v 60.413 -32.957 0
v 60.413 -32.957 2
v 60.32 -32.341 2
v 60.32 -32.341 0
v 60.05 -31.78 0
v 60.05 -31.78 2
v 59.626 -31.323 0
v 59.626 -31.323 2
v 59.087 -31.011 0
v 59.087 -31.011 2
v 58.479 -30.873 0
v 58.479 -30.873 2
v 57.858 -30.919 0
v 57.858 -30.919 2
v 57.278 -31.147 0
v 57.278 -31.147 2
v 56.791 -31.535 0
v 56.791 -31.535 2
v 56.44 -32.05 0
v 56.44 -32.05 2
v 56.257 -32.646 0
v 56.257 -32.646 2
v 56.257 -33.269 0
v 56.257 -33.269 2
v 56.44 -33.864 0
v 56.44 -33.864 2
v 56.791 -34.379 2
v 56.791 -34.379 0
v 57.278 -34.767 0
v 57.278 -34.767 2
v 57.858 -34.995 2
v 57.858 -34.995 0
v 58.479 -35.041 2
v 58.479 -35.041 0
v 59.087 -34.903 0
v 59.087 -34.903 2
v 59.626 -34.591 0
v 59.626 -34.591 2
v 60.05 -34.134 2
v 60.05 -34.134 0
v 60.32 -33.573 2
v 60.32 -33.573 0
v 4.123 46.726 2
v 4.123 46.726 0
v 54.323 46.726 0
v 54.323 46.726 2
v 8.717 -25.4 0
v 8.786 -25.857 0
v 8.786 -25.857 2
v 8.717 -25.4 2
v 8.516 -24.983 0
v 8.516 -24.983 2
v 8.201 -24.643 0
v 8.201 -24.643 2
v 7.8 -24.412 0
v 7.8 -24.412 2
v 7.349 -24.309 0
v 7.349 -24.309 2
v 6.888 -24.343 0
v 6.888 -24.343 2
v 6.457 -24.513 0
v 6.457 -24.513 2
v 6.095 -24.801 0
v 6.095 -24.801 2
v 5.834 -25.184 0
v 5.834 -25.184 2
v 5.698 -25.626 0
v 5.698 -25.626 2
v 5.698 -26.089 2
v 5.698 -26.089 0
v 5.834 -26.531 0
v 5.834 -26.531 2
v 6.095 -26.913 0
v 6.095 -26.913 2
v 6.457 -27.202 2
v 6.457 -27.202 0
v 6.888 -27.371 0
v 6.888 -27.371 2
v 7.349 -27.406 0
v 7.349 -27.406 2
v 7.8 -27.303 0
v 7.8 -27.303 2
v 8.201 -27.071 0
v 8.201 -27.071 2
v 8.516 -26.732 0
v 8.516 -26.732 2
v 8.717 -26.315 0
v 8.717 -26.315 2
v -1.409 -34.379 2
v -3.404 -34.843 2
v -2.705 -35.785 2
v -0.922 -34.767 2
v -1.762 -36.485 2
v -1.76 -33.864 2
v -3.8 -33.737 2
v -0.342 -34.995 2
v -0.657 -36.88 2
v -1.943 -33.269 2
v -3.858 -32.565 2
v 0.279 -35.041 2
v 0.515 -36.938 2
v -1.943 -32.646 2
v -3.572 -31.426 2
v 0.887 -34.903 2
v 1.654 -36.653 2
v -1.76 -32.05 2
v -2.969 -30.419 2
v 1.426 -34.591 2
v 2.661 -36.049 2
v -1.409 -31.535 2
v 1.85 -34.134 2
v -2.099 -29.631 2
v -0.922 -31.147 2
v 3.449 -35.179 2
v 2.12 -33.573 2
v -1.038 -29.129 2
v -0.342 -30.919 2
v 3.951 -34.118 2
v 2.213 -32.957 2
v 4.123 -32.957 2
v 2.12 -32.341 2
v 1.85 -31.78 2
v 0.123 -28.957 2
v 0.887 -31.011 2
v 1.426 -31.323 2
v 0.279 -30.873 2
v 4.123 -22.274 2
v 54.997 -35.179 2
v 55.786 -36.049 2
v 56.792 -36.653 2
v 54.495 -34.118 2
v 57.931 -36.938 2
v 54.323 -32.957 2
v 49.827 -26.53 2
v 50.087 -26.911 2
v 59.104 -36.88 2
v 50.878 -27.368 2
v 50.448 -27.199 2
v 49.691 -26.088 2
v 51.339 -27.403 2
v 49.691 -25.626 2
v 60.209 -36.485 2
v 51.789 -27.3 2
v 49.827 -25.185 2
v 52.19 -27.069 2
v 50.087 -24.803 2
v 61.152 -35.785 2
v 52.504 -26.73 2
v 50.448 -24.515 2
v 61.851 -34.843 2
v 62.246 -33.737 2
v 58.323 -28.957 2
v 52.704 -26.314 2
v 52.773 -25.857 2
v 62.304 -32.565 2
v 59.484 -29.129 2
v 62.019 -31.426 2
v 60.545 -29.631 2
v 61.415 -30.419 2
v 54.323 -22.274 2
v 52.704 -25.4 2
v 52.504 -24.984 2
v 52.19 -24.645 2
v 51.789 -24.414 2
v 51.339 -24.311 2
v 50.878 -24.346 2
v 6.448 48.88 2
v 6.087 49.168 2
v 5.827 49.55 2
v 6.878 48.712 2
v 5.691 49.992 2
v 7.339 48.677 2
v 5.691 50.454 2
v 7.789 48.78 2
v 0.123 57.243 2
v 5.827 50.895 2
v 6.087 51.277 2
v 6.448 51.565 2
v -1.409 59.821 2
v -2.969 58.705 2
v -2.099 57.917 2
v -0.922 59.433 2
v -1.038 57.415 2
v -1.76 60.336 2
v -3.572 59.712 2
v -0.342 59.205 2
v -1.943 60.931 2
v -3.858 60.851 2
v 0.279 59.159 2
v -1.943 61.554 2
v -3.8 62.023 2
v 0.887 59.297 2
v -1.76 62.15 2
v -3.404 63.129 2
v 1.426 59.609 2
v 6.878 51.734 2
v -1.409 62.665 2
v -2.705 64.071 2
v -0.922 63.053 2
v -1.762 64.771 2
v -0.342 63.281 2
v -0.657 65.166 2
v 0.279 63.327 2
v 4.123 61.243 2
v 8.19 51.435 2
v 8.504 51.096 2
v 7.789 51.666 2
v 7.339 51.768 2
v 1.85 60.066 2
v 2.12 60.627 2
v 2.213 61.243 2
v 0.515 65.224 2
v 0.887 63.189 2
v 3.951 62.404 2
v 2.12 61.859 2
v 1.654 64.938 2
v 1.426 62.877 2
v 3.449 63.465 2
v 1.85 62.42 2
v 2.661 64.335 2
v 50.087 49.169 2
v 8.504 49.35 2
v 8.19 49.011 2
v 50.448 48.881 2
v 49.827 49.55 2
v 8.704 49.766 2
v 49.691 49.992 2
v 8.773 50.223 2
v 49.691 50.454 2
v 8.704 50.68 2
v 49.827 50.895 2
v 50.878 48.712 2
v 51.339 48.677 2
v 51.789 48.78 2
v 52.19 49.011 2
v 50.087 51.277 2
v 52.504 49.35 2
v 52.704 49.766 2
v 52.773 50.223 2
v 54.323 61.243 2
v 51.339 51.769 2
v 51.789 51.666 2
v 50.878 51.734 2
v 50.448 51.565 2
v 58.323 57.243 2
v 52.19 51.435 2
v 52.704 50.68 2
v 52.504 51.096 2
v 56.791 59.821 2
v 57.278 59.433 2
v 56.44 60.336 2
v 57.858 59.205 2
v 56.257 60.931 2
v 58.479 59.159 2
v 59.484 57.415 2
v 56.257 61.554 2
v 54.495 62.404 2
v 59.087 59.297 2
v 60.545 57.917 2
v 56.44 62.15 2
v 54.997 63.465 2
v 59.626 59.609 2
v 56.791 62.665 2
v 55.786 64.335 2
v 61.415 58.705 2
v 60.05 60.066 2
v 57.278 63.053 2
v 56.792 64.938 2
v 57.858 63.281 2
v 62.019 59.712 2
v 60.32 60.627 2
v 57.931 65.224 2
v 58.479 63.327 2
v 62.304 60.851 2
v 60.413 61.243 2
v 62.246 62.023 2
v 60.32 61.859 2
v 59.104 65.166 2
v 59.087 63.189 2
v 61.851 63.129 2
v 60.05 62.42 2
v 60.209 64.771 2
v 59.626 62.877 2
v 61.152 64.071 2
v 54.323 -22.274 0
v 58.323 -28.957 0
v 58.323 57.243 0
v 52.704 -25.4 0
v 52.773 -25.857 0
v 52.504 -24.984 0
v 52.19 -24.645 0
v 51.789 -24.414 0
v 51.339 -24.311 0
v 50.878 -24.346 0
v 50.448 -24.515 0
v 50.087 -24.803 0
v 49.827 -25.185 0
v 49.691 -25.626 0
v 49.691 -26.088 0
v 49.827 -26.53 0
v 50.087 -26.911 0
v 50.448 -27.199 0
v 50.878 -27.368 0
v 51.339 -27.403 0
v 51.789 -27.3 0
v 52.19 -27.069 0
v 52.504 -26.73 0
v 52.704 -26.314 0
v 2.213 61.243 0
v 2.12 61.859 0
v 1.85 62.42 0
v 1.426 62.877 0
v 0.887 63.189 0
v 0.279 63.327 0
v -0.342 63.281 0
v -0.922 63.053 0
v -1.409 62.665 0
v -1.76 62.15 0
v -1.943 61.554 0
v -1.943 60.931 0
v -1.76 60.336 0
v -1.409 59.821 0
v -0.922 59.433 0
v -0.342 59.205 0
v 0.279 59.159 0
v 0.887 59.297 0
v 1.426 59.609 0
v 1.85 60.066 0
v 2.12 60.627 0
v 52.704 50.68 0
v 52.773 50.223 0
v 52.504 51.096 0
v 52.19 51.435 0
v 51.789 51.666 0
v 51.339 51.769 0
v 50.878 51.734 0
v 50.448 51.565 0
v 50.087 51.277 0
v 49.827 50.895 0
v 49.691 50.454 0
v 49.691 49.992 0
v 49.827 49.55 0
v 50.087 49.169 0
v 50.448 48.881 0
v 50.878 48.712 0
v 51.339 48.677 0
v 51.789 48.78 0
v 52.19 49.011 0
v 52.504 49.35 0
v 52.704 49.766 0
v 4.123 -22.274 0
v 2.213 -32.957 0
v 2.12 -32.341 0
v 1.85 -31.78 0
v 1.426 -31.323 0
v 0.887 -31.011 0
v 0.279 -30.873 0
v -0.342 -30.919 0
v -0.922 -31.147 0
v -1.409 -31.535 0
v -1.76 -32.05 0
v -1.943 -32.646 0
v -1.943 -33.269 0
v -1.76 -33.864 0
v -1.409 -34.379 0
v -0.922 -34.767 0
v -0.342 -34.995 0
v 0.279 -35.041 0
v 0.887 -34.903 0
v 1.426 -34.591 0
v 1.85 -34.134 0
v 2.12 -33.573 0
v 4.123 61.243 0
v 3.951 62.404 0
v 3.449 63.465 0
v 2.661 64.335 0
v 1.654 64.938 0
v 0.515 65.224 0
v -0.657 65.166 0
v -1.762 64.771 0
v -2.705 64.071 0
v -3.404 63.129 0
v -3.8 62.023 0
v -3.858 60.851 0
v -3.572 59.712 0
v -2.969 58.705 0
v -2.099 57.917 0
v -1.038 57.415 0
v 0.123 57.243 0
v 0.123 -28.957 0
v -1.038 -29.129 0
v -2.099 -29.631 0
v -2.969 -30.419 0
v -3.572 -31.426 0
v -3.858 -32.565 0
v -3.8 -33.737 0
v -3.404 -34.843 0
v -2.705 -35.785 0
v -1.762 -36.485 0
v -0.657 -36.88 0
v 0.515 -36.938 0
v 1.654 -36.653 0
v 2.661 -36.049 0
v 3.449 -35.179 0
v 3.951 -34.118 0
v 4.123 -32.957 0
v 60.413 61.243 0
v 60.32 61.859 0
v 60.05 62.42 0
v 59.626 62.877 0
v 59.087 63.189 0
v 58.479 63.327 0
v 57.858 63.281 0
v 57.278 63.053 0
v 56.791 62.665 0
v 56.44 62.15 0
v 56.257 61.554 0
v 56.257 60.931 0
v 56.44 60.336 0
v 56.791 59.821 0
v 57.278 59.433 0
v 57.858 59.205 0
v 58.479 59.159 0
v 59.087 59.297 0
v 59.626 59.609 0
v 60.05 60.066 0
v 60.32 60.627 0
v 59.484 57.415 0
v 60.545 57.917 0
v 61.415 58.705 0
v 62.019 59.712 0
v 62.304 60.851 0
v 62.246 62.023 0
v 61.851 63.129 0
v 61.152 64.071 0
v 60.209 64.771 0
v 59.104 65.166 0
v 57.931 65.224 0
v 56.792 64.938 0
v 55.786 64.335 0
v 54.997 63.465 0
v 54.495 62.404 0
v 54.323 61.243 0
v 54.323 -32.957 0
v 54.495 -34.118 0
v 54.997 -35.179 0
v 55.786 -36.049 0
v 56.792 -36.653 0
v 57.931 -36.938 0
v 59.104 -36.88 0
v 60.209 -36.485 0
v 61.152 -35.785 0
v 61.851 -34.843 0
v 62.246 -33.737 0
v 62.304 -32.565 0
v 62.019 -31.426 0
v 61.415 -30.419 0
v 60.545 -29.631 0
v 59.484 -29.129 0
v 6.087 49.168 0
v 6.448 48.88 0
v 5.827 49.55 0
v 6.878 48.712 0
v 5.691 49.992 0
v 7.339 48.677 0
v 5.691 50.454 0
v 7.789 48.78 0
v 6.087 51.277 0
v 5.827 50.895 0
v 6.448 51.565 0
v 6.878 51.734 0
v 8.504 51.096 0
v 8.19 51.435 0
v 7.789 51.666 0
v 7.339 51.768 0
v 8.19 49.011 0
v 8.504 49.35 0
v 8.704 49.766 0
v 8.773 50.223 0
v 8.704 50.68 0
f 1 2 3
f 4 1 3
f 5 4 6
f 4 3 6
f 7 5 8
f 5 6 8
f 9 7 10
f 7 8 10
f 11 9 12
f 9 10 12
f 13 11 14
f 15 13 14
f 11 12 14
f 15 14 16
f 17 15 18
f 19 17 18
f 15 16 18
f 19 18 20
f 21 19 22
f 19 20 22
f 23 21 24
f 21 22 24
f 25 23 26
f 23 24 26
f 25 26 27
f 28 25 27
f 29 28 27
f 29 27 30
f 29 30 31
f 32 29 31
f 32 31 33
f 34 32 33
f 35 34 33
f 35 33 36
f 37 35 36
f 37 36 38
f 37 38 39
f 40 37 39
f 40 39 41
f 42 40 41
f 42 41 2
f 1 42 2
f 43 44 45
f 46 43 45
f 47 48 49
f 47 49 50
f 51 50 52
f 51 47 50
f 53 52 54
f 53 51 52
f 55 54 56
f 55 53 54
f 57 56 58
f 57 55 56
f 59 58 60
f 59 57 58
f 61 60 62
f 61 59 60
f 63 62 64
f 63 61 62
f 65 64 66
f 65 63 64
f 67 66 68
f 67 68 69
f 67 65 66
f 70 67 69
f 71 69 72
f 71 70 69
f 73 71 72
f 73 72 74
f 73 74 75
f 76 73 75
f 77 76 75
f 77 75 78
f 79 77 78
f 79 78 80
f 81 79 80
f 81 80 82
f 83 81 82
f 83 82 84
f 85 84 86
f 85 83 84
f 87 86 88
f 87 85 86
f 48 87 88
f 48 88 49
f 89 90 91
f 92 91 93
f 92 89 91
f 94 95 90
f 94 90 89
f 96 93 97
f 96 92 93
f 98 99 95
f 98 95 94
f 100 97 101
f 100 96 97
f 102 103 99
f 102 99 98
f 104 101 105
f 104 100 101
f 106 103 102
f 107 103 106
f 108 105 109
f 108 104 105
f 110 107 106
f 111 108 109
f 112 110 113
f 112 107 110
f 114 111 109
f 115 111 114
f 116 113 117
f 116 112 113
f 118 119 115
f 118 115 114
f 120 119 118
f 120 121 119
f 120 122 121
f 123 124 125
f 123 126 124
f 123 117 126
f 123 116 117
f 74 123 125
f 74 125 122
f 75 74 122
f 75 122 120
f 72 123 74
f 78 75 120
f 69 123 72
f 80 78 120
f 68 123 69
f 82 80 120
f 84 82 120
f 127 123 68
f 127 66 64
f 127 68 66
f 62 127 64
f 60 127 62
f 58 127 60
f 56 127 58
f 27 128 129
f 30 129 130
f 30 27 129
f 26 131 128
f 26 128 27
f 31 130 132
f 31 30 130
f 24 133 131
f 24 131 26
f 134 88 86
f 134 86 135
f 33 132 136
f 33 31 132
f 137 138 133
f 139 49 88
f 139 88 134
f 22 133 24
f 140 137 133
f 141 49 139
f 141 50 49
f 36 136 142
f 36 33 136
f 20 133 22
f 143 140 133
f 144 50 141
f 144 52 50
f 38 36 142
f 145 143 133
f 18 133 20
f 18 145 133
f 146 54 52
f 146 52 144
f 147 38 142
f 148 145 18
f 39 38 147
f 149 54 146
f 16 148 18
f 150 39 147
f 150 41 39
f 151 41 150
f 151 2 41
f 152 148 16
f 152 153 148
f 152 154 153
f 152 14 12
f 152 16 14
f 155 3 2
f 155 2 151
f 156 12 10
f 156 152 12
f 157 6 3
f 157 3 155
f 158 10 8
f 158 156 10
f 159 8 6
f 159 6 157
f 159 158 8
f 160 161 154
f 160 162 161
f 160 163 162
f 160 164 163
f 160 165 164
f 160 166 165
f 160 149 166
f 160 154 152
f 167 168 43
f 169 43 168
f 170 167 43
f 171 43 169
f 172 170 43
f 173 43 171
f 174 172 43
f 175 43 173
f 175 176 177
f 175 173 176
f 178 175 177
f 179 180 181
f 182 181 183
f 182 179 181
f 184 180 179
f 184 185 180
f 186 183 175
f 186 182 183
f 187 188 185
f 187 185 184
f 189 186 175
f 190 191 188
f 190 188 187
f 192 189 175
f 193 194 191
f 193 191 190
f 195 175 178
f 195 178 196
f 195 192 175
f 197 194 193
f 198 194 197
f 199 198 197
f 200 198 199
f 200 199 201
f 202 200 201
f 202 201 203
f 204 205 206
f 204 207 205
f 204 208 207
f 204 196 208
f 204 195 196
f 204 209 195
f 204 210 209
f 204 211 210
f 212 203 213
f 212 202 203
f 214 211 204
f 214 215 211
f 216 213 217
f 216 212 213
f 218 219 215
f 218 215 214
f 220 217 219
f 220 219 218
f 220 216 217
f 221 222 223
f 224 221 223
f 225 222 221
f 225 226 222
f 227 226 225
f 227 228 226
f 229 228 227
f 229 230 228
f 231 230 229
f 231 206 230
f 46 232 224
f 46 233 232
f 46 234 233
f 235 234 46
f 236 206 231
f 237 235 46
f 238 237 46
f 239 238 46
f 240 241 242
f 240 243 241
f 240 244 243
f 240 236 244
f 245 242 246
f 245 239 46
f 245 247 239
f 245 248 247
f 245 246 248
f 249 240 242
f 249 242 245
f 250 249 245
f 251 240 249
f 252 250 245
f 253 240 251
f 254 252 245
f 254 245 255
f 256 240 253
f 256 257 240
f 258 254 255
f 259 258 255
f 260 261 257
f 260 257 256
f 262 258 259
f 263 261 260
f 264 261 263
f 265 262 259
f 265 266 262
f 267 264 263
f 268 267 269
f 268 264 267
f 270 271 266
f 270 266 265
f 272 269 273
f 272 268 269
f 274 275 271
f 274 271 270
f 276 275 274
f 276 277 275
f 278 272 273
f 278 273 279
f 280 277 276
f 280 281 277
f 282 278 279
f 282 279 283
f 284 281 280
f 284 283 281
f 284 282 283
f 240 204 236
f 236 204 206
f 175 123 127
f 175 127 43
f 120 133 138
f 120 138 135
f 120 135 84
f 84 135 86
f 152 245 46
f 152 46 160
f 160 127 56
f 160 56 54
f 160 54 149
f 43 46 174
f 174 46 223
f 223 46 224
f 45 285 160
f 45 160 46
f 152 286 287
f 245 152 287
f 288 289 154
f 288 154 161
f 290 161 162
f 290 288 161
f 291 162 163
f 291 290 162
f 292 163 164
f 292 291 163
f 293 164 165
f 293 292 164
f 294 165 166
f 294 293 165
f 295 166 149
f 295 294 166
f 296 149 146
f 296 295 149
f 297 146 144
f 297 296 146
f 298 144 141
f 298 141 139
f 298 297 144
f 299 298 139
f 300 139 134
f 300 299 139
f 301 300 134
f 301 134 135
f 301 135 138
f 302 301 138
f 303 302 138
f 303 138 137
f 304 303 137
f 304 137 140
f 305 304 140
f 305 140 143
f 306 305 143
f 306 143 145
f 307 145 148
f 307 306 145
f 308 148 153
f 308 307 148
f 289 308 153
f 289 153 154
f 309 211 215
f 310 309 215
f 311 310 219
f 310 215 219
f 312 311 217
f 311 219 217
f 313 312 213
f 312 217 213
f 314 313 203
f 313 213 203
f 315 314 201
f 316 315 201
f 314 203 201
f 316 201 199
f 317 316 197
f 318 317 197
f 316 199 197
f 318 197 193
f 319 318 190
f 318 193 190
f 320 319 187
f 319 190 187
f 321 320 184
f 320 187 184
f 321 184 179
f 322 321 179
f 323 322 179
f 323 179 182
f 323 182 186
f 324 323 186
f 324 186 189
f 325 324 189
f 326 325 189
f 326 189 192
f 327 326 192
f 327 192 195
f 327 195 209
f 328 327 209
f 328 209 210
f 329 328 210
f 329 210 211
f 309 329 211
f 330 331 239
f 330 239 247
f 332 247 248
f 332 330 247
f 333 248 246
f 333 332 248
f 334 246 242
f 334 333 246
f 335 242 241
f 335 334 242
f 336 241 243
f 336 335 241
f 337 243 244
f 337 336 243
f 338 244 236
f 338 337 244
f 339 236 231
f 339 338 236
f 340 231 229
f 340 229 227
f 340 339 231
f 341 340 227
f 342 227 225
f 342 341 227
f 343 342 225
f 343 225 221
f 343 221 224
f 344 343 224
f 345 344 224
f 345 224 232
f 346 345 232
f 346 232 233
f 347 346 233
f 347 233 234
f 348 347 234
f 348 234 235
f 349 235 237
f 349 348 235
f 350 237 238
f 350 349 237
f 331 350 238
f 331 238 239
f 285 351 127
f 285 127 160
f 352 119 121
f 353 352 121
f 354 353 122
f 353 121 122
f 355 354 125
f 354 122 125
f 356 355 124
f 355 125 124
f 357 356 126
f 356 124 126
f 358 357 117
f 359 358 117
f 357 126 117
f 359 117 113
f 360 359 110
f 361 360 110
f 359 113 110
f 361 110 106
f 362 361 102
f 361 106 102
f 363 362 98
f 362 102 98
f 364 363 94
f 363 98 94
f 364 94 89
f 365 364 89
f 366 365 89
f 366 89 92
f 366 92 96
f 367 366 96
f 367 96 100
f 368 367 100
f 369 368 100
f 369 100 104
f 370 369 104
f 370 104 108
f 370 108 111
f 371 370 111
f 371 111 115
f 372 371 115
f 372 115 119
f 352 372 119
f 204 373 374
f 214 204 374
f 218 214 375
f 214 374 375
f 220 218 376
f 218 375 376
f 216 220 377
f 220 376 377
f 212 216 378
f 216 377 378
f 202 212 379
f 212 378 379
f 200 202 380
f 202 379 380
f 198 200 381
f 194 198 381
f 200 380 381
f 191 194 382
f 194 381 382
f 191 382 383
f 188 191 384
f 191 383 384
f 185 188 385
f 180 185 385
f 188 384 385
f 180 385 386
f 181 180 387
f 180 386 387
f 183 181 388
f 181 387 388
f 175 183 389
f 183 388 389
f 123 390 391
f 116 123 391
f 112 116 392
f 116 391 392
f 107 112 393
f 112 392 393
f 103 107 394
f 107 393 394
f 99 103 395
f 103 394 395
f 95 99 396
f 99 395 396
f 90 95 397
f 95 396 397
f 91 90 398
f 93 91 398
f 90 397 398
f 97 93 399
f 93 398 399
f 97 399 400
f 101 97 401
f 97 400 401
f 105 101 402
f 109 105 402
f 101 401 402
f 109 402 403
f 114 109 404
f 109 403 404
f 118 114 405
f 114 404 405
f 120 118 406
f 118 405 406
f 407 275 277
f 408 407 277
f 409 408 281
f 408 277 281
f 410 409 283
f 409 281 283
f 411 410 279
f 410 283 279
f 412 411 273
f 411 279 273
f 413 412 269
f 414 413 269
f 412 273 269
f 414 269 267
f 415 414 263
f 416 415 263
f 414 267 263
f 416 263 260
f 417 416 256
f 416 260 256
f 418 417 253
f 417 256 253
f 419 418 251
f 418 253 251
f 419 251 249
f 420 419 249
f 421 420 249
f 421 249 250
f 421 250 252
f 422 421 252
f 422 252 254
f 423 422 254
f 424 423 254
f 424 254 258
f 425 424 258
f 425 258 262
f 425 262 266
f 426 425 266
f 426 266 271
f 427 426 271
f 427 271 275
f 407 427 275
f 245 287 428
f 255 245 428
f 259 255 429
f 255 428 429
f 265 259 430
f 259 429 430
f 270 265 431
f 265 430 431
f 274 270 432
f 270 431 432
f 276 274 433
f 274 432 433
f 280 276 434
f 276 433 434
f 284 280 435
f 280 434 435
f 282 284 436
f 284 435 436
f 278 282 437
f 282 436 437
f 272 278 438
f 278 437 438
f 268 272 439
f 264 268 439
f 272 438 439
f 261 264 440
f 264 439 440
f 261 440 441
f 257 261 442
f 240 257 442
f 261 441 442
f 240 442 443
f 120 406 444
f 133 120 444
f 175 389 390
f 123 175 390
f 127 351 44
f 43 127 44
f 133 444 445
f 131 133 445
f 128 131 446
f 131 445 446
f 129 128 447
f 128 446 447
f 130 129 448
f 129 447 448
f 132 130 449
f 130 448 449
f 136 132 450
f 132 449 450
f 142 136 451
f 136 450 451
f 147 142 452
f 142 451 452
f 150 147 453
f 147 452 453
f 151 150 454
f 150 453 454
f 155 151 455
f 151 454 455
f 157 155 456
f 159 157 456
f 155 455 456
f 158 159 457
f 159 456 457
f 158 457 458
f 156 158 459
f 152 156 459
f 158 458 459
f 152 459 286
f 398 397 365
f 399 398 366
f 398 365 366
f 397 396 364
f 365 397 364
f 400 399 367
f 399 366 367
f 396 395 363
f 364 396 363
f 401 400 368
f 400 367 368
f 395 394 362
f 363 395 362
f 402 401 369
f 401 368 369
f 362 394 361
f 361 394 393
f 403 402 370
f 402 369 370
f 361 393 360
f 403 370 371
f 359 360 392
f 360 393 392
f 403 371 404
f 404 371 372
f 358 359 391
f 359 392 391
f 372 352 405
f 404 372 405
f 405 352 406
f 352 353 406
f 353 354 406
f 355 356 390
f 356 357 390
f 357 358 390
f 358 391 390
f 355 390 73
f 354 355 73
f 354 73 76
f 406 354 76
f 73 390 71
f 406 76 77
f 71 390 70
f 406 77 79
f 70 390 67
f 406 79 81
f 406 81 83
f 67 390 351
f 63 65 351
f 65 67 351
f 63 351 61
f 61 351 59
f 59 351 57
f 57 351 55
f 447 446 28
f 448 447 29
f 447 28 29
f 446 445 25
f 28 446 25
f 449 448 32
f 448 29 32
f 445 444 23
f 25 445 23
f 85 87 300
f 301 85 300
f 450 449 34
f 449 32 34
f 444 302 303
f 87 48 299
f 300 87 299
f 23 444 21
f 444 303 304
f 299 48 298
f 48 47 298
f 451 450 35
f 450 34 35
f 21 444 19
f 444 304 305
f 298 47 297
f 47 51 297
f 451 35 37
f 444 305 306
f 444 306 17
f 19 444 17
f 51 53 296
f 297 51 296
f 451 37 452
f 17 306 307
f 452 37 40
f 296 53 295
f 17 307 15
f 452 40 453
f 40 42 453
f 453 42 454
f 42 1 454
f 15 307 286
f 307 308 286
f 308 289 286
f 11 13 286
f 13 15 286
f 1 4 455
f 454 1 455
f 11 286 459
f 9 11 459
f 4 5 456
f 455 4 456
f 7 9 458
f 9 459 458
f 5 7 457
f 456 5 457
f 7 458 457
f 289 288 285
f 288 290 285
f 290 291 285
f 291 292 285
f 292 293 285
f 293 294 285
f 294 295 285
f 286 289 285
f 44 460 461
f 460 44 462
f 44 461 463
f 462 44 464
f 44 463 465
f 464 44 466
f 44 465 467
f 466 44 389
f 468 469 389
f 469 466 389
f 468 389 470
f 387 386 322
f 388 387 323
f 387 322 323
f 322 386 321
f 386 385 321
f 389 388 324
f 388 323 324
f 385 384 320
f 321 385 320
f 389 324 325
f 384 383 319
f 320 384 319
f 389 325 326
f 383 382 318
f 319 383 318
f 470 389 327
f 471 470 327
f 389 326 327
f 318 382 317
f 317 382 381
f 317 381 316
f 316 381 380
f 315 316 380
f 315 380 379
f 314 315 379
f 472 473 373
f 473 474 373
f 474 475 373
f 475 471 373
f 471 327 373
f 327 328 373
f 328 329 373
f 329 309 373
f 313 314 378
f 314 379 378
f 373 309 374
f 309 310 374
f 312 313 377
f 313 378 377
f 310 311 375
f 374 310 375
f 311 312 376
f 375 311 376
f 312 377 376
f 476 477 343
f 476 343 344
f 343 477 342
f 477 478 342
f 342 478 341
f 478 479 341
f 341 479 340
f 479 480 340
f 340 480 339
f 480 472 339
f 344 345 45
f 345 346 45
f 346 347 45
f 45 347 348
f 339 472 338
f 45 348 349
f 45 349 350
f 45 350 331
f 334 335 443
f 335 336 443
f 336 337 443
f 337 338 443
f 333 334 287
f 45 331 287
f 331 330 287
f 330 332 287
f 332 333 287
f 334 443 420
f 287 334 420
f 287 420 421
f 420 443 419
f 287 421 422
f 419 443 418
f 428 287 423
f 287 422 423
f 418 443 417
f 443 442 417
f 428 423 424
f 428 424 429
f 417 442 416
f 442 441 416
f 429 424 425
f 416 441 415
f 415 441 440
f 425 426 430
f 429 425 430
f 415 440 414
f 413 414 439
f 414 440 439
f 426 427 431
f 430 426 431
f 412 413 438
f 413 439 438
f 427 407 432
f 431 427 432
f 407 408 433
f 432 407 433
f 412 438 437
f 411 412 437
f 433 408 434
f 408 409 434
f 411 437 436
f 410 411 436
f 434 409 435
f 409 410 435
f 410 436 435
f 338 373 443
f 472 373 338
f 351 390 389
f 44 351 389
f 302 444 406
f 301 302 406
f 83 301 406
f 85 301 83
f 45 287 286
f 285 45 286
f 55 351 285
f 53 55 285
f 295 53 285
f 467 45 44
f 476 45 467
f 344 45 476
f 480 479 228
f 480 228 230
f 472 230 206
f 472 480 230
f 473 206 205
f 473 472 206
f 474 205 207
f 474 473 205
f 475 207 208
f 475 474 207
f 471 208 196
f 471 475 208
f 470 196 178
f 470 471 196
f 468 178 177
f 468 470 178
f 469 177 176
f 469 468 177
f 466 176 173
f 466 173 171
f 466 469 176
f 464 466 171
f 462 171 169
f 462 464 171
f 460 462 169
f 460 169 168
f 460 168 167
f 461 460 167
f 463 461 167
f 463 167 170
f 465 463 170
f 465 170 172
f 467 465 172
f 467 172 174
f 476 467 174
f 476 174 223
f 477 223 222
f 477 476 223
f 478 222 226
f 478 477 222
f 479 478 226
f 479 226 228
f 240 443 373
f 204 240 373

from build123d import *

# Parameters (mm, degrees)
SKETCH1_R           = 1.55
SKETCH1_R_2         = 1.552736715
SKETCH1_W           = 50.2
SKETCH1_H           = 69
BOSS_EXTRUDE1_DEPTH = 2
SKETCH2_R           = 2.09
CUT_EXTRUDE1_DEPTH  = 10


with BuildPart() as part:
    # Sketch1 → Boss-Extrude1 (new body)
    with BuildSketch(Plane.XY):
        with BuildLine():
            Line((54.323201224, 61.242975378), (4.123201224, 61.242975378))
            ThreePointArc((4.123201224, 61.242975378), (-2.705225901, 64.071402503), (0.123201224, 57.242975378))
            Line((0.123201224, 57.242975378), (0.123201224, -28.957024622))
            ThreePointArc((0.123201224, -28.957024622), (-2.705225901, -35.785451747), (4.123201224, -32.957024622))
            Line((4.123201224, -32.957024622), (54.323201224, -32.957024622))
            ThreePointArc((54.323201224, -32.957024622), (61.151628348, -35.785451747), (58.323201224, -28.957024622))
            Line((58.323201224, -28.957024622), (58.323201224, 57.242975378))
            ThreePointArc((58.323201224, 57.242975378), (61.151628348, 64.071402503), (54.323201224, 61.242975378))
        make_face()
        with Locations((7.223201224, 50.222695663)):
            Circle(SKETCH1_R, mode=Mode.SUBTRACT)
        with Locations((51.223201224, 50.222975378)):
            Circle(SKETCH1_R, mode=Mode.SUBTRACT)
        with Locations((7.233060223, -25.857304337)):
            Circle(SKETCH1_R_2, mode=Mode.SUBTRACT)
        with Locations((51.223201224, -25.857024622)):
            Circle(SKETCH1_R, mode=Mode.SUBTRACT)
        with Locations((29.223201224, 12.225914551)):
            Rectangle(SKETCH1_W, SKETCH1_H, mode=Mode.SUBTRACT)
    extrude(amount=BOSS_EXTRUDE1_DEPTH)

    # Sketch2 → Cut-Extrude1 (cut)
    with BuildSketch(Plane.XY.offset(2)):
        with Locations((0.123201224, 61.242975378)):
            Circle(SKETCH2_R)
        with Locations((58.323201224, 61.242975378)):
            Circle(SKETCH2_R)
        with Locations((0.123201224, -32.957024622)):
            Circle(SKETCH2_R)
        with Locations((58.323201224, -32.957024622)):
            Circle(SKETCH2_R)
    extrude(amount=-CUT_EXTRUDE1_DEPTH, mode=Mode.SUBTRACT)


solid = part.part
